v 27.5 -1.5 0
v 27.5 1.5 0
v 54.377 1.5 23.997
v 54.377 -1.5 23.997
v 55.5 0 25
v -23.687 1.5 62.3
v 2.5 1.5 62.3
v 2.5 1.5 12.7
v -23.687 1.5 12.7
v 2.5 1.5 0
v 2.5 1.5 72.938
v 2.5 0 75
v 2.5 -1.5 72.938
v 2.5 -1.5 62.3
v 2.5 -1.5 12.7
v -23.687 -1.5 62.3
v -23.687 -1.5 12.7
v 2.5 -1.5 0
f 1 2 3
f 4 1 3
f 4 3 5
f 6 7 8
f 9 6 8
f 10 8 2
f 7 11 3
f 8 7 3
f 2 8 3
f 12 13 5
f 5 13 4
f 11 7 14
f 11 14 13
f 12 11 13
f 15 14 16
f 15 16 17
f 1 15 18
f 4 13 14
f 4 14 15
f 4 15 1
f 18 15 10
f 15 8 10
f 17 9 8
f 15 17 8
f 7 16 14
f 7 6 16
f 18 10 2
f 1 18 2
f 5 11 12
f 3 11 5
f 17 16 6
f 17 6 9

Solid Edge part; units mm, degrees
sketch "Sketch1" plane through (0, 0, 0) normal (0, -1, 0) x (1, 0, 0)
  line L0 (55.5, 25) -> (2.5, 75)
  line L1 (2.5, 62.3) -> (2.5, 75)
  line L2 (0, 62.3) -> (2.5, 62.3)
  line L3 (0, 12.7) -> (0, 62.3)
  line L4 (0, 12.7) -> (2.5, 12.7)
  line L5 (2.5, 12.7) -> (2.5, 0)
  line L6 (2.5, 0) -> (27.5, 0)
  line L7 (27.5, 0) -> (55.5, 25)
extrude "Protrusion1" add sketch "Sketch1" along normal mid plane 3
chamfer "Chamfer_1" distance 1.5 angle 45 2 edges at (29, -1.5, 50) (29, 1.5, 50)
sketch "Sketch2" plane through (27.1885, -1.5, 36.4689) normal (0, -1, 0) x (-1, 0, 0)
  line L0 (24.6885, -25.8311) -> (50.8759, -25.8311)
  line L1 (50.8759, -25.8311) -> (50.8759, 23.7689)
  line L2 (50.8759, 23.7689) -> (24.6885, 23.7689)
  line L3 (24.6885, 23.7689) -> (24.6885, -25.8311)
extrude "Protrusion2" add sketch "Sketch2" against normal up to vertex (3 mm away)
